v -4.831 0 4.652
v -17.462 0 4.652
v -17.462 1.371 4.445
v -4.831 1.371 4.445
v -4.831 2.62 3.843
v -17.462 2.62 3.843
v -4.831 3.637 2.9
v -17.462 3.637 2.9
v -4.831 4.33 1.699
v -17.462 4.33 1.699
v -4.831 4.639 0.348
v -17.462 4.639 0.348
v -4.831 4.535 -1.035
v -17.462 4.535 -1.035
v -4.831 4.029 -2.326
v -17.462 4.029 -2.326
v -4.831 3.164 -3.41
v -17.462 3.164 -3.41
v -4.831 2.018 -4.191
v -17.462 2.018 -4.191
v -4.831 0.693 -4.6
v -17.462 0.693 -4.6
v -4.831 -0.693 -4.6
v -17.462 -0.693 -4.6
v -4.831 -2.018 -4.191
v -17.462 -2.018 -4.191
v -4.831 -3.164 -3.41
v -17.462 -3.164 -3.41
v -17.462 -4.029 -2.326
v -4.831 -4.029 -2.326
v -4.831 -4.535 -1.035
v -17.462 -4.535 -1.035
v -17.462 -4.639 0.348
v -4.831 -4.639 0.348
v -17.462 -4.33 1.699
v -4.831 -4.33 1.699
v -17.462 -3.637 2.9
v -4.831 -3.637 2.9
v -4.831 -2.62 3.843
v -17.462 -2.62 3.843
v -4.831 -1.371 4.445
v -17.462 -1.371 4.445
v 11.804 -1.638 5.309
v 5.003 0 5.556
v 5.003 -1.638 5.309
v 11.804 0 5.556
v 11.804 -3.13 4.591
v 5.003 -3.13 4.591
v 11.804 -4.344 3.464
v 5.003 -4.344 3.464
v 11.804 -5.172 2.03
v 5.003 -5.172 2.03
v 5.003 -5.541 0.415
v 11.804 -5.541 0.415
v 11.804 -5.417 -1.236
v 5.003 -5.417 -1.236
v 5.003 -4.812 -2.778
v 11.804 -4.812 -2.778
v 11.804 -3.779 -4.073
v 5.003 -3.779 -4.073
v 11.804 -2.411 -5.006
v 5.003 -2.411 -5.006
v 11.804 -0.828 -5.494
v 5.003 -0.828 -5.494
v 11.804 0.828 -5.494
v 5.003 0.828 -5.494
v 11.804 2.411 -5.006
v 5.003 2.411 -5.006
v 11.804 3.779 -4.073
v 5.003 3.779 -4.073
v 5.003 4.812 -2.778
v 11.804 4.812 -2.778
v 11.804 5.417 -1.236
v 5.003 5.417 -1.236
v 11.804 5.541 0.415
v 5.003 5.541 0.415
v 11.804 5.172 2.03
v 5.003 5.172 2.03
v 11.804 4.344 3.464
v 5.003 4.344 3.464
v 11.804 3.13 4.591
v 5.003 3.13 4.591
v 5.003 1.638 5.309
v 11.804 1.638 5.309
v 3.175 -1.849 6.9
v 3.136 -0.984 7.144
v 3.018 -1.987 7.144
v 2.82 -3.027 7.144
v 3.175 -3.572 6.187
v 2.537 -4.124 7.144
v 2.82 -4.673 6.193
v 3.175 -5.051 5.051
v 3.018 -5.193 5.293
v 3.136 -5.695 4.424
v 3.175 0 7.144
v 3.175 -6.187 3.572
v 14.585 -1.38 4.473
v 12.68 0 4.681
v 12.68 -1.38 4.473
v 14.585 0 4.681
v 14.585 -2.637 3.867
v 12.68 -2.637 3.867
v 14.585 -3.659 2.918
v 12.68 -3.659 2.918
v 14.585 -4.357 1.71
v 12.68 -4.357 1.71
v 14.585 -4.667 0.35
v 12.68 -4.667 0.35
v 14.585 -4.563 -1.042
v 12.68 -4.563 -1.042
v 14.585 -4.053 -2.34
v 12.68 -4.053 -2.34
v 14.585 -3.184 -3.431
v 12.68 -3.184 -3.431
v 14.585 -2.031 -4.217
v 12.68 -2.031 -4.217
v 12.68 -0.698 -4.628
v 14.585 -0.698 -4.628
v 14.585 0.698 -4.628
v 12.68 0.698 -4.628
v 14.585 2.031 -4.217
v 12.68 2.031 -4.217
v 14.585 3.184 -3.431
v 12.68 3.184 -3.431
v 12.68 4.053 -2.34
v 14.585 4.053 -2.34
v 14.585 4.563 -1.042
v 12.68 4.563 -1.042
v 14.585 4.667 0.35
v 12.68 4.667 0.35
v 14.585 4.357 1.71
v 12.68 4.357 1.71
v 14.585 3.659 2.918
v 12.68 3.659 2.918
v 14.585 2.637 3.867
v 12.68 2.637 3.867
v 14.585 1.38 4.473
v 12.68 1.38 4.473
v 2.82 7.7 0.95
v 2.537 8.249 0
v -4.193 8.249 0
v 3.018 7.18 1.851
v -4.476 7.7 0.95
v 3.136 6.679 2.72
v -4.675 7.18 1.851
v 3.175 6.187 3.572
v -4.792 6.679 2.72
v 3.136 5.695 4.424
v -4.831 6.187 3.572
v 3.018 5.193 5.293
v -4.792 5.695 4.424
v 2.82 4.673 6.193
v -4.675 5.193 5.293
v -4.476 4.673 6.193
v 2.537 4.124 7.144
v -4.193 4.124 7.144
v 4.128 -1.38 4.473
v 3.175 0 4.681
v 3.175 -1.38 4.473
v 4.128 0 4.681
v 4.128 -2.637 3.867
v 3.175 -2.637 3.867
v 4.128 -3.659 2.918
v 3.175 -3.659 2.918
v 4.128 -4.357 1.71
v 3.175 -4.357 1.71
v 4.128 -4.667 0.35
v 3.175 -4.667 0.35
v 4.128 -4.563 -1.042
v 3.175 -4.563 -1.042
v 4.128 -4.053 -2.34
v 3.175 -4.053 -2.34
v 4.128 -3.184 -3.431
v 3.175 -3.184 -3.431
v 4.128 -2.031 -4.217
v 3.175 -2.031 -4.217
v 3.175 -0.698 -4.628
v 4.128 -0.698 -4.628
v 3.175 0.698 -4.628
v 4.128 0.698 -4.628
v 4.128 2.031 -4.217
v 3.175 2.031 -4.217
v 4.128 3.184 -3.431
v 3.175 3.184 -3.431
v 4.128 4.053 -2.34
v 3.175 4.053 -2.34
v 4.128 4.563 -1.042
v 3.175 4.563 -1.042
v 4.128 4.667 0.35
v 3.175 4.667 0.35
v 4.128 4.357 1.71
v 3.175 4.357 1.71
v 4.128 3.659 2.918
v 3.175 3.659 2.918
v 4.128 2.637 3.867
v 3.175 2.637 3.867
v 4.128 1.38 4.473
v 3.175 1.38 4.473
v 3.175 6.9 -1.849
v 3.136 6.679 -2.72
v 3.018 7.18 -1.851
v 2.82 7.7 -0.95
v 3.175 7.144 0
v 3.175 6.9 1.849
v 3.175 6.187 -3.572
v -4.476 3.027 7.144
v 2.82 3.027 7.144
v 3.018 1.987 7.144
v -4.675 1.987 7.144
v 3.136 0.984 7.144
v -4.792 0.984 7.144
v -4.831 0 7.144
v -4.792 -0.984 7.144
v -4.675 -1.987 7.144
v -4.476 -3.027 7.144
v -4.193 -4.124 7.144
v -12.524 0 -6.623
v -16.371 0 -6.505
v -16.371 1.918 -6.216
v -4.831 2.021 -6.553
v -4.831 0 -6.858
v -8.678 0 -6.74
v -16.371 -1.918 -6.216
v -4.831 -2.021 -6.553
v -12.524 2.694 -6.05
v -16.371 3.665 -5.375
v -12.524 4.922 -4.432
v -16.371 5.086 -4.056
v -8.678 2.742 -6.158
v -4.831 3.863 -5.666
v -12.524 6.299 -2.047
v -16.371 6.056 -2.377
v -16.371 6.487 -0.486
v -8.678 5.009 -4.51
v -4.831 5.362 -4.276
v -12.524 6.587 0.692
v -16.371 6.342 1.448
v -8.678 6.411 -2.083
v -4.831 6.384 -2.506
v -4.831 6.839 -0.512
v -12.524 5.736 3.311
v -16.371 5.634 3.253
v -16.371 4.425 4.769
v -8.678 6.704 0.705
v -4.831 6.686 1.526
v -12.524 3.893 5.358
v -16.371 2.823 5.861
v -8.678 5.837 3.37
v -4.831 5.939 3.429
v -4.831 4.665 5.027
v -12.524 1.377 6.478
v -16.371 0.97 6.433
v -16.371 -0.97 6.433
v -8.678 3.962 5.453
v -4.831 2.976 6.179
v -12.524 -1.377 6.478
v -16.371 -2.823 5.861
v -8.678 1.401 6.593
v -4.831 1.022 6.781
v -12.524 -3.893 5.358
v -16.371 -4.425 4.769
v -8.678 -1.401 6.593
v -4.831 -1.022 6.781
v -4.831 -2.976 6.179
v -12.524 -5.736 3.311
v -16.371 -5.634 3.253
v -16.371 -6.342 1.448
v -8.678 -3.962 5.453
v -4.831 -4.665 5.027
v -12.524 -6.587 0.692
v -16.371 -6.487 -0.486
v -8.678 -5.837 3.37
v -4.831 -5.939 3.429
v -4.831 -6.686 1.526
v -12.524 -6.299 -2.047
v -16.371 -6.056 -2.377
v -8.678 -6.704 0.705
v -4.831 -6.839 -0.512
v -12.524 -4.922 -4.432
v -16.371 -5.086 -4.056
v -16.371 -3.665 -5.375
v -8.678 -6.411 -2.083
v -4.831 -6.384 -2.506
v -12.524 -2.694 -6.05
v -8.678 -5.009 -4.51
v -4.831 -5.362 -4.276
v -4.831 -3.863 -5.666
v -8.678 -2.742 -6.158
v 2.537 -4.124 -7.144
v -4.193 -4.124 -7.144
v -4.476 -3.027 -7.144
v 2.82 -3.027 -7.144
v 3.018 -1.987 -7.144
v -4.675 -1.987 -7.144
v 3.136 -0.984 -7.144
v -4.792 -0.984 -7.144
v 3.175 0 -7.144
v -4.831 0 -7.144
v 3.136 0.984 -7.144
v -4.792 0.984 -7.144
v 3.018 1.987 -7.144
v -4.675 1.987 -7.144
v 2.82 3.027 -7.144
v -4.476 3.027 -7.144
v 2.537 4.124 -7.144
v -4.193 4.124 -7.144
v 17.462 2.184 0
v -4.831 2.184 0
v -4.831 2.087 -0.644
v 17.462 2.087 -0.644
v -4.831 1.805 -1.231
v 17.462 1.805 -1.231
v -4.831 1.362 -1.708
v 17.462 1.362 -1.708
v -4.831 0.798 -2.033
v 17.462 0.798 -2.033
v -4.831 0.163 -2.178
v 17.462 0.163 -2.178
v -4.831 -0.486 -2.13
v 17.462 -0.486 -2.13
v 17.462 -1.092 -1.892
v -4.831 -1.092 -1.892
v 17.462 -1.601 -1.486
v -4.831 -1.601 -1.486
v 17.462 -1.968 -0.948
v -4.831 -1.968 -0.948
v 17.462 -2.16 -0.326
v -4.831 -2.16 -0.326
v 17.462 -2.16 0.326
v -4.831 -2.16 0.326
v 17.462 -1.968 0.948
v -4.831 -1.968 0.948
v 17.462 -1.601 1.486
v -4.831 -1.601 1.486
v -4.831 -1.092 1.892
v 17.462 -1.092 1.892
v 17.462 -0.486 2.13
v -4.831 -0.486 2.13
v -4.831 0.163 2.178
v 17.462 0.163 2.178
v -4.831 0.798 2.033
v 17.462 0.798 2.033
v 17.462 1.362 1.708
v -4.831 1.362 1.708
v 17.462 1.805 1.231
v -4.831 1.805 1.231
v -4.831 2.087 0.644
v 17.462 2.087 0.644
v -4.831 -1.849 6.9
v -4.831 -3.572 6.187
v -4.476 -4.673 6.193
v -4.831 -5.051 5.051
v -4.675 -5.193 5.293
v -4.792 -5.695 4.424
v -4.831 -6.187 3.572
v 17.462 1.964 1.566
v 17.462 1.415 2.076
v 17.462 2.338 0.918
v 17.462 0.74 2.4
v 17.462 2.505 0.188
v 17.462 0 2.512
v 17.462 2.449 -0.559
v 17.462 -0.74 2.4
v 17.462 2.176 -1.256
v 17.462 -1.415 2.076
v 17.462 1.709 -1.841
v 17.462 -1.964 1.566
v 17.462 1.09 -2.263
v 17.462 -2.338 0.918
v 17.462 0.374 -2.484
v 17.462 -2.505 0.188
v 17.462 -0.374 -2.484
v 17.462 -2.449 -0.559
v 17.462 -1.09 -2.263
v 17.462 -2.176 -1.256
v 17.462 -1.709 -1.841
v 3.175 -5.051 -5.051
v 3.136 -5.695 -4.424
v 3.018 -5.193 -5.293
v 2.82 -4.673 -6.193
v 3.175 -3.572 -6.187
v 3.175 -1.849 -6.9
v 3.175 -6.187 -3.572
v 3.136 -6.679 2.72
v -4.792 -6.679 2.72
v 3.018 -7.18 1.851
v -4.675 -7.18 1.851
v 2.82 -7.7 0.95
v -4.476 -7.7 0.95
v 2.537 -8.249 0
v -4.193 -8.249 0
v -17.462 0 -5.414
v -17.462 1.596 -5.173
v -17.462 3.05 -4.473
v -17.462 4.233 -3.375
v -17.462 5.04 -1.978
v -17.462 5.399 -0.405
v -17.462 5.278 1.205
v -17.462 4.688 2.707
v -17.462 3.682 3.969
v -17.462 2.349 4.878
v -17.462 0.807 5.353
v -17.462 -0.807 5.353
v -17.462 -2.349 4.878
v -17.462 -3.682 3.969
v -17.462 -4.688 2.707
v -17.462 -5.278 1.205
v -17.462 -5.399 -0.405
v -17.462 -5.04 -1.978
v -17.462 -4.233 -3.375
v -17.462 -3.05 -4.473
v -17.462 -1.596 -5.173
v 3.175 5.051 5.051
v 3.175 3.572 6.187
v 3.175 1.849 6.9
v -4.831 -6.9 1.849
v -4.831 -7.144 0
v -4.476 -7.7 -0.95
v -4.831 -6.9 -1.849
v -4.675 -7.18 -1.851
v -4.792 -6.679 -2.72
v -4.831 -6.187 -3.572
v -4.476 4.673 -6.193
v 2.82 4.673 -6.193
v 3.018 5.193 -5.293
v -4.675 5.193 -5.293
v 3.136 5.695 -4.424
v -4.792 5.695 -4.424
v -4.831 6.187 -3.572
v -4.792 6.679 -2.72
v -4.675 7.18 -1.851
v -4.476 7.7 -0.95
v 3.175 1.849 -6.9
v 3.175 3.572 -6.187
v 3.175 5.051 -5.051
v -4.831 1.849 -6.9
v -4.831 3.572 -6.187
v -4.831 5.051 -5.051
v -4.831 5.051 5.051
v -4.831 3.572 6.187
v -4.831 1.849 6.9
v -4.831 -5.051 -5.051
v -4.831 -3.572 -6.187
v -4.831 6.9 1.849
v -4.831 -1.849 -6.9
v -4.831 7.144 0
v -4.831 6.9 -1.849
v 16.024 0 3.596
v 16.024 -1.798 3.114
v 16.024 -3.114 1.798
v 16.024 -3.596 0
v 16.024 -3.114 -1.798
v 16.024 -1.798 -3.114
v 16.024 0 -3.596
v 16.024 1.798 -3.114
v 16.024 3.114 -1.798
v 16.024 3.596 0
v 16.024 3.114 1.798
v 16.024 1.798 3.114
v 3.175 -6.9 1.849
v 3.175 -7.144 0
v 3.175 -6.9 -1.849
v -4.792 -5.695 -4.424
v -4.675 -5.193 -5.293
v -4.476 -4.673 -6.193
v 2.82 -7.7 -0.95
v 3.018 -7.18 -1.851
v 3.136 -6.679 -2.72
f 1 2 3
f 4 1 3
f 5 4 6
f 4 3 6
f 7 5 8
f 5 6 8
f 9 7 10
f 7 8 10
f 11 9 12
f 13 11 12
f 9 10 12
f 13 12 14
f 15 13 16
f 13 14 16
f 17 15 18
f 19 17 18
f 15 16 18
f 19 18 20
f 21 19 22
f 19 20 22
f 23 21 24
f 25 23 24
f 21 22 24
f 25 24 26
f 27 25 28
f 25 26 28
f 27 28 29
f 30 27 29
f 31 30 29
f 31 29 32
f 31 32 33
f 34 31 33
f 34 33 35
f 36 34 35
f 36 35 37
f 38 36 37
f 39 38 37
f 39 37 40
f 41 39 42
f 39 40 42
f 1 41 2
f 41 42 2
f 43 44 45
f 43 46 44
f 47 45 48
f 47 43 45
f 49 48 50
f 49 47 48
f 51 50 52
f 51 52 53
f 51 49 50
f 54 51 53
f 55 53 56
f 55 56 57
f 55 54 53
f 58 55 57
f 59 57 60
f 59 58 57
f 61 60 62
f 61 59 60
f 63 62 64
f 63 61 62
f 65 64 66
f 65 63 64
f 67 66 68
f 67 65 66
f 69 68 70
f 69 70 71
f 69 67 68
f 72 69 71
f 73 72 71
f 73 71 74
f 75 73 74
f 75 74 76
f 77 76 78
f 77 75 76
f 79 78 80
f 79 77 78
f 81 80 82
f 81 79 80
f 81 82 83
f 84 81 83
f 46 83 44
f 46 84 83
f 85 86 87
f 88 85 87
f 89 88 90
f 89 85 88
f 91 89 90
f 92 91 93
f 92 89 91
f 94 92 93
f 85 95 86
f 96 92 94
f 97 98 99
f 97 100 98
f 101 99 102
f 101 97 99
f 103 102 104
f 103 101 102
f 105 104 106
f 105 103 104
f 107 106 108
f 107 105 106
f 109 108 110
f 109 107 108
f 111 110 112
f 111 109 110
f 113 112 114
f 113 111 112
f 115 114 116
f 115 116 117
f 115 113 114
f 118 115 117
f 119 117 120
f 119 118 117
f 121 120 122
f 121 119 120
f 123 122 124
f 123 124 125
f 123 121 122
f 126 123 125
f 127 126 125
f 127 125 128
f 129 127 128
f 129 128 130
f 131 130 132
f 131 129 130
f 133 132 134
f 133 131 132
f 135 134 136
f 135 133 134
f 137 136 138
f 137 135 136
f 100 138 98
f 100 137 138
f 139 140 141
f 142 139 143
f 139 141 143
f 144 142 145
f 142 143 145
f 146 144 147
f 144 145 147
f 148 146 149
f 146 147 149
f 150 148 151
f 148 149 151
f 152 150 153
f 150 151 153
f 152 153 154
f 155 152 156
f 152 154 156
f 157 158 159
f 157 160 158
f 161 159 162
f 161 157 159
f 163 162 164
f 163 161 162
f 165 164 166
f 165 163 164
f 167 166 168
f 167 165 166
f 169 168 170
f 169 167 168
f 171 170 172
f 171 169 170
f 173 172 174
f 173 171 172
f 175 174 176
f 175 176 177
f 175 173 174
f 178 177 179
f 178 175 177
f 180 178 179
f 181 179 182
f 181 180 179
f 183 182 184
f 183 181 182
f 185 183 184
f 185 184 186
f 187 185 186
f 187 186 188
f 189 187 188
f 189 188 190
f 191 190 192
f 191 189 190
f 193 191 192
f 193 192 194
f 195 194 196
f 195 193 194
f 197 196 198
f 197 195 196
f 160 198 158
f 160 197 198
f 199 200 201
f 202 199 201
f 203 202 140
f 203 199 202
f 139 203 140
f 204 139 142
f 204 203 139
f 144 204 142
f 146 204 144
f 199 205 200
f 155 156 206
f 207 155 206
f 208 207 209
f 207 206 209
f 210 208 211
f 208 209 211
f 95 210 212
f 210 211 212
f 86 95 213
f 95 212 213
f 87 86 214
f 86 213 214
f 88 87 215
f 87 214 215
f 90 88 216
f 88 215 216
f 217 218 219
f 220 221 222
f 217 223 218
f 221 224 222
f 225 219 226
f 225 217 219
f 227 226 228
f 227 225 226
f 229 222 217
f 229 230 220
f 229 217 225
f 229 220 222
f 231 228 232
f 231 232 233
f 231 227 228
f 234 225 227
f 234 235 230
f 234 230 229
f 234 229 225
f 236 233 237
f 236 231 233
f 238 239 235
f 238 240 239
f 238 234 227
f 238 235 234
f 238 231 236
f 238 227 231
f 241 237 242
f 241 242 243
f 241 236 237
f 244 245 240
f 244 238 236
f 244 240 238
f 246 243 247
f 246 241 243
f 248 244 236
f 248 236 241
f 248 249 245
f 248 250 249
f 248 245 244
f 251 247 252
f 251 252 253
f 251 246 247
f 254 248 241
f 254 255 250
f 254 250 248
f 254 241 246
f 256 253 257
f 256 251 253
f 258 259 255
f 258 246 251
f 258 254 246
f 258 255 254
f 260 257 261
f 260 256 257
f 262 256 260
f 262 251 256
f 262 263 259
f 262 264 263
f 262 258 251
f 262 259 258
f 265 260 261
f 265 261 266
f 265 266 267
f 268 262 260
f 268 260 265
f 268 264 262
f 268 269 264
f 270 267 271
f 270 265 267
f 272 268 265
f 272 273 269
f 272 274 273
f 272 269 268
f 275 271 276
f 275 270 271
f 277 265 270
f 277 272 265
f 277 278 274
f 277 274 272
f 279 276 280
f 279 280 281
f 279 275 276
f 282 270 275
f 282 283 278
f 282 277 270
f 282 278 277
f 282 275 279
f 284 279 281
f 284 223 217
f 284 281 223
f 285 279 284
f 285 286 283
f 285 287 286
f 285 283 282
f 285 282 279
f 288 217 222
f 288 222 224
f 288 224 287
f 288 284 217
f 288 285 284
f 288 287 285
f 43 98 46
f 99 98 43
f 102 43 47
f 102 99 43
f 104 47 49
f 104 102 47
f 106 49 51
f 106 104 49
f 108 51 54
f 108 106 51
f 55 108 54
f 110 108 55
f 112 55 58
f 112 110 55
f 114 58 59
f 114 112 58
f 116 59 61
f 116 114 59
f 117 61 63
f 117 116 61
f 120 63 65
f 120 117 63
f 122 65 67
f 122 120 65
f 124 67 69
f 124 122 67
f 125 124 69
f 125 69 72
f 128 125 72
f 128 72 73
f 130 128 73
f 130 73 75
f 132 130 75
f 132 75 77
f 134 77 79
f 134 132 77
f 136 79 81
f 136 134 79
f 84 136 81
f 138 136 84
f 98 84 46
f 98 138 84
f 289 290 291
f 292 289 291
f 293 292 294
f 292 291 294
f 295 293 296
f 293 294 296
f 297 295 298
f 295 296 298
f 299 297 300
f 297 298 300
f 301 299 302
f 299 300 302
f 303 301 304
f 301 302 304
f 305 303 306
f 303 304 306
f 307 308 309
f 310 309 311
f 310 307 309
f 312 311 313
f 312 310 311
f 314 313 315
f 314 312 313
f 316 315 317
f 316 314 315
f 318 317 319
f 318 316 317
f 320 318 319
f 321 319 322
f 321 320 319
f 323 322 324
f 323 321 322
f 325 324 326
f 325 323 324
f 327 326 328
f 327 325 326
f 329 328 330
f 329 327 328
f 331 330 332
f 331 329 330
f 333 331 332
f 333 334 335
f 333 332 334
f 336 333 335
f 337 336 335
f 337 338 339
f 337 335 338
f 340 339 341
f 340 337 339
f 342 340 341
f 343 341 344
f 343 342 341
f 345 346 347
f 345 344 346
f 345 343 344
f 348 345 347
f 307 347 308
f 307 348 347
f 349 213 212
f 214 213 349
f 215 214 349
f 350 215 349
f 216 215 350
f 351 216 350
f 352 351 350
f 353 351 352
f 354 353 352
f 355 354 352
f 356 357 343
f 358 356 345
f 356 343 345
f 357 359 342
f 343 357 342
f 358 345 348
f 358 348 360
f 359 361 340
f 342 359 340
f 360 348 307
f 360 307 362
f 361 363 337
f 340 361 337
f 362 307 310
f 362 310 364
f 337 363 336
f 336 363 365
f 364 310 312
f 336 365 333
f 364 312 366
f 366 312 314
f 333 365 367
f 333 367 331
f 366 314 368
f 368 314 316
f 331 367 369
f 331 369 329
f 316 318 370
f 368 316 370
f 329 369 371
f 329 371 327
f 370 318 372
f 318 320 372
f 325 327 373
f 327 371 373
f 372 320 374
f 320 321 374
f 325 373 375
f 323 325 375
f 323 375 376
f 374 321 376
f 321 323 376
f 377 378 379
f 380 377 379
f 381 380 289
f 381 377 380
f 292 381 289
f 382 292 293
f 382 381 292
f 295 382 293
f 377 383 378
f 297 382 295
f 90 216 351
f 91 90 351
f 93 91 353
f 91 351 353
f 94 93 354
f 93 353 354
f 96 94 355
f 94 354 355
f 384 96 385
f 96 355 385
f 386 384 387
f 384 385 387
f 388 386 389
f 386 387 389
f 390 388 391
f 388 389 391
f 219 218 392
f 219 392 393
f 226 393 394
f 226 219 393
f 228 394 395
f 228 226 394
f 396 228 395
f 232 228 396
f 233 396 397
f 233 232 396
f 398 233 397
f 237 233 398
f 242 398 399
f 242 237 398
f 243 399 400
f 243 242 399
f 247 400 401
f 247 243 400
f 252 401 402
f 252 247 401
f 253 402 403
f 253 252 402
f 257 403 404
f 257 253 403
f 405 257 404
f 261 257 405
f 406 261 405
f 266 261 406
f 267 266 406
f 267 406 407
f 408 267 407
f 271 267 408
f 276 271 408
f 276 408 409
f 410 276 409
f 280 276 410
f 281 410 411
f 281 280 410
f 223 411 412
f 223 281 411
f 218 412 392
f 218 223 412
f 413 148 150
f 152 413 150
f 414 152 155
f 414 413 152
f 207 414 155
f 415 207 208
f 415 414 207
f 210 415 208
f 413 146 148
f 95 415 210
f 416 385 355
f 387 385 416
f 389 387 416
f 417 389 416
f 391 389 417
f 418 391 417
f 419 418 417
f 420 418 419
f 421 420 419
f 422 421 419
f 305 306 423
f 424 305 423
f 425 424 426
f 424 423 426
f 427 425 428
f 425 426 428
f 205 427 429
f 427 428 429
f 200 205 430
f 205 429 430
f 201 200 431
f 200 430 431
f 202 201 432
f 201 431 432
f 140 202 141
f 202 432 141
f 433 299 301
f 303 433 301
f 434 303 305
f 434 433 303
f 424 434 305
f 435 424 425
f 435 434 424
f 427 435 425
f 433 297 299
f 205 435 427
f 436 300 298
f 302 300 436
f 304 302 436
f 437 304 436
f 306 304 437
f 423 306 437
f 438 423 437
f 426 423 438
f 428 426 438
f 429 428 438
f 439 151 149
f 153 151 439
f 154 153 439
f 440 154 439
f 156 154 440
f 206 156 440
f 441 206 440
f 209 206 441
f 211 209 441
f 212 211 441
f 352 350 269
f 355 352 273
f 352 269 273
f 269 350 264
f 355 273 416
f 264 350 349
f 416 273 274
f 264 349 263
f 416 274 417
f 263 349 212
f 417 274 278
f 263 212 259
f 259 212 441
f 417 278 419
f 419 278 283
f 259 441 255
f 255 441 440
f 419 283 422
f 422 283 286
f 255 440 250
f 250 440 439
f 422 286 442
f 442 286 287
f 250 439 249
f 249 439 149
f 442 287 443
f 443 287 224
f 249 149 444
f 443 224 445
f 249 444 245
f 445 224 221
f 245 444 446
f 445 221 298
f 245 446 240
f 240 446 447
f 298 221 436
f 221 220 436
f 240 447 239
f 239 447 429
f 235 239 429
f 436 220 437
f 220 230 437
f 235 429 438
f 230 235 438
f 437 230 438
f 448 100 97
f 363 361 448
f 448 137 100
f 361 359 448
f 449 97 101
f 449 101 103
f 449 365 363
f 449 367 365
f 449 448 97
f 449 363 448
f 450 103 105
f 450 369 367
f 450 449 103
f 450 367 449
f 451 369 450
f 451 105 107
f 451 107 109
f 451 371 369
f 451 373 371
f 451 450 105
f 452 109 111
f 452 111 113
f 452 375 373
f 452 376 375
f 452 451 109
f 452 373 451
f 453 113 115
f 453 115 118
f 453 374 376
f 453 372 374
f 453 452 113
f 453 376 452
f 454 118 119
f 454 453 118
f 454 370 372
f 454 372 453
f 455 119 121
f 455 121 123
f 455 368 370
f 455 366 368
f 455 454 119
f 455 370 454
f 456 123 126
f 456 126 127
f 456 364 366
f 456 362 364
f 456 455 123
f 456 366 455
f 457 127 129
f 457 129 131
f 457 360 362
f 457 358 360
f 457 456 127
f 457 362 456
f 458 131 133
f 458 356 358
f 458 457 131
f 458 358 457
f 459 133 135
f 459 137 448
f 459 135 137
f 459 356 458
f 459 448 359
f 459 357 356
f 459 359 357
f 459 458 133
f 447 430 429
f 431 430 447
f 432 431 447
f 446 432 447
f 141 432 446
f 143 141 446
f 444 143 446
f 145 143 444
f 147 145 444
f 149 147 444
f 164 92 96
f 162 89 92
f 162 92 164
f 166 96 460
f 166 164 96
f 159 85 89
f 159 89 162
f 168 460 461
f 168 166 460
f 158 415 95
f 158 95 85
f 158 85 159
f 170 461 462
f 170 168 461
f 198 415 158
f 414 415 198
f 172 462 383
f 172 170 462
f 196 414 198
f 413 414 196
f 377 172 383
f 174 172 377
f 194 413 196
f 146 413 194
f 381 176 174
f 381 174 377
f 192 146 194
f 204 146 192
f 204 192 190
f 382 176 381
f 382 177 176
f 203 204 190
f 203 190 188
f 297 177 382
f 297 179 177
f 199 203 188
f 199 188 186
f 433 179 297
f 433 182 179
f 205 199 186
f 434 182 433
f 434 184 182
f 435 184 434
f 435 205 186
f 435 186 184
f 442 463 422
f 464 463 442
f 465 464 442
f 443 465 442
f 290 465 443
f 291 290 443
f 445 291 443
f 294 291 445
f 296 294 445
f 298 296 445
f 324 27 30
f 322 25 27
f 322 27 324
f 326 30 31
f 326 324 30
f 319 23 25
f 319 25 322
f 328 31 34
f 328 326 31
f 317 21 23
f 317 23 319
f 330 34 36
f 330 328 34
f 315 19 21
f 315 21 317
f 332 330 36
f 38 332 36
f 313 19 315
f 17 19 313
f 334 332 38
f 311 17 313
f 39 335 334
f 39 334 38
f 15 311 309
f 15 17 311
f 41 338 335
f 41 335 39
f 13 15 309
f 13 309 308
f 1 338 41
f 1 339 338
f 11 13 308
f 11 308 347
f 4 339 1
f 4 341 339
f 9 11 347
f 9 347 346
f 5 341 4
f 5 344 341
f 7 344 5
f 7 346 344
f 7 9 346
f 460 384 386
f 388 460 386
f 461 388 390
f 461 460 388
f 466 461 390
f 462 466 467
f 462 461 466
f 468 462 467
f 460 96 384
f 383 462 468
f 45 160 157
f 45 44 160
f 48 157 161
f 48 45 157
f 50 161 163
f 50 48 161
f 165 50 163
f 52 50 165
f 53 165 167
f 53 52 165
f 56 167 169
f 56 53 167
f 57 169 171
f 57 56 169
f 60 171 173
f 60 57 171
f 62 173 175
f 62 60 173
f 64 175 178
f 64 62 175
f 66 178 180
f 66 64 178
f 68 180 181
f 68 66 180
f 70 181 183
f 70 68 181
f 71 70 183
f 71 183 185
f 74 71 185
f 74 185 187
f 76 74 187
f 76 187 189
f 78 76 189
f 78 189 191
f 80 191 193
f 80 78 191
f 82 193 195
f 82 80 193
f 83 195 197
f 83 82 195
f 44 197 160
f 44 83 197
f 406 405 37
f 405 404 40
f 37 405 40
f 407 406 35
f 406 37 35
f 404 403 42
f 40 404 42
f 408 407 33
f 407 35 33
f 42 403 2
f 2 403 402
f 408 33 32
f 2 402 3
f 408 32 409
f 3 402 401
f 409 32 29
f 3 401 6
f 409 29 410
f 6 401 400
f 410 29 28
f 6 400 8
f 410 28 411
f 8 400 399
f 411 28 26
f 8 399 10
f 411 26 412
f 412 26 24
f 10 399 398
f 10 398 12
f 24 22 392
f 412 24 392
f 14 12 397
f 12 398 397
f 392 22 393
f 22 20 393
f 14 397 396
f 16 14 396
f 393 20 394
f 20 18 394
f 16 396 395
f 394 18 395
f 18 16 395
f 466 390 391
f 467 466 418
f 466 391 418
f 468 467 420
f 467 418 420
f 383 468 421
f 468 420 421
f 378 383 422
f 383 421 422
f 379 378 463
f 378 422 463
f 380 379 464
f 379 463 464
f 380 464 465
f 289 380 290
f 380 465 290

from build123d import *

# Parameters (mm, degrees)
SKETCH6_W           = 34.925
SKETCH6_H           = 5.55625
EXTRUDE1_DEPTH      = 8.00608
SKETCH7_W           = 34.925
SKETCH7_H           = 2.1844
SKETCH17_R          = 5.55625
CUT_EXTRUDE1_DEPTH  = 12.63142
SKETCH19_R          = 6.858
BOSS_EXTRUDE1_DEPTH = 12.63142
BOSS_EXTRUDE1_DRAFT = -1.75
CHAMFER1_SIZE       = 1.058333333
CHAMFER1_SIZE2      = 1.092196811
SKETCH22_R          = 6.858
BOSS_EXTRUDE3_DEPTH = 12.63142
BOSS_EXTRUDE3_DRAFT = -15
SKETCH23_R          = 4.651741881
CUT_EXTRUDE2_DEPTH  = 12.63142


with BuildPart() as part:
    # Sketch6 → Revolve3 (revolve)
    with BuildSketch(Plane.XY, mode=Mode.PRIVATE) as revolve3_sk:
        with Locations((0, 2.778125)):
            Rectangle(SKETCH6_W, SKETCH6_H)
    revolve(revolve3_sk.sketch.rotate(Axis((-17.4625, 0, 0), (1, 0, 0)), 90), axis=Axis((-17.4625, 0, 0), (1, 0, 0)))

    # Sketch12 → Extrude1 (add)
    with BuildSketch(Plane(origin=(-4.83108, 0, 0), x_dir=(0, 0, -1), z_dir=(1, 0, 0))):
        Polygon((0, 8.248891971), (-7.14375, 4.124445986), (-7.14375, -4.124445986), (0, -8.248891971), (7.14375, -4.124445986), (7.14375, 4.124445986), align=None)
    extrude(amount=EXTRUDE1_DEPTH)

    # Sketch10 → Cut-Revolve6 (revolve, cut)
    with BuildSketch(Plane.XY, mode=Mode.PRIVATE) as cut_revolve6_sk:
        Polygon((5.003189197, 5.55625), (3.175, 5.55625), (3.175, 4.680560803), (4.1275, 4.680560803), align=None)
        Polygon((17.4625, 5.55625), (11.804113042, 5.55625), (12.679802239, 4.680560803), (14.584802239, 4.680560803), (17.4625, 2.51206), align=None)
    revolve(cut_revolve6_sk.sketch.rotate(Axis((-17.4625, 0, 0), (1, 0, 0)), 90), axis=Axis((-17.4625, 0, 0), (1, 0, 0)), mode=Mode.SUBTRACT)

    # Sketch7 → Cut-Revolve5 (revolve, cut)
    with BuildSketch(Plane.XY):
        with Locations((0, 1.0922)):
            Rectangle(SKETCH7_W, SKETCH7_H)
    revolve(axis=Axis((17.4625, 0, 0), (-1, 0, 0)), mode=Mode.SUBTRACT)

    # Sketch13 → Cut-Revolve7 (revolve, cut)
    with BuildSketch(Plane.XY):
        Polygon((-4.83108, 8.248891971), (-4.83108, 7.14375), (-4.193025986, 8.248891971), align=None)
        Polygon((2.536945986, 8.248891971), (3.175, 7.14375), (3.175, 8.248891971), align=None)
    revolve(axis=Axis((-17.4625, 0, 0), (1, 0, 0)), mode=Mode.SUBTRACT)

    # Sketch17 → Cut-Extrude1 (cut)
    with BuildSketch(Plane.ZY.offset(17.4625)):
        Circle(SKETCH17_R)
    extrude(amount=-CUT_EXTRUDE1_DEPTH, mode=Mode.SUBTRACT)


with BuildPart() as body_2:
    # Sketch19 → Boss-Extrude1 (with draft: the straight prism first)
    with BuildSketch(Plane(origin=(-4.83108, 0, 0), x_dir=(0, 0, -1), z_dir=(1, 0, 0))):
        Circle(SKETCH19_R)
    extrude(amount=-BOSS_EXTRUDE1_DEPTH)
    # Boss-Extrude1: the draft: its side faces are tilted about the plane it starts from
    boss_extrude1_sides = [body_2.faces().sort_by_distance(p)[0] for p in [
        (-11.14679, 0, 6.858),
    ]]
    draft(boss_extrude1_sides, Plane(origin=(-4.83108, 0, 0), x_dir=(0, 0, -1), z_dir=(1, 0, 0)), BOSS_EXTRUDE1_DRAFT)

    # Chamfer1
    chamfer1_edges = [body_2.edges().sort_by_distance(p)[0] for p in [
        (-17.4625, 0, 6.472075215),
    ]]
    chamfer1_side = [body_2.faces().sort_by_distance(p)[0] for p in [
        (-17.4625, 0, 0),
    ]]
    chamfer(chamfer1_edges, length=CHAMFER1_SIZE, length2=CHAMFER1_SIZE2, reference=chamfer1_side[0])


with BuildPart() as boss_extrude3_tool:
    # Sketch22 → Boss-Extrude3 (with draft: the straight prism first)
    with BuildSketch(Plane(origin=(-4.83108, 0, 0), x_dir=(0, 0, -1), z_dir=(1, 0, 0))):
        Circle(SKETCH22_R)
    extrude(amount=-BOSS_EXTRUDE3_DEPTH)
    # Boss-Extrude3: the draft: its side faces are tilted about the plane it starts from
    boss_extrude3_sides = [boss_extrude3_tool.faces().sort_by_distance(p)[0] for p in [
        (-11.14679, 0, 6.858),
    ]]
    draft(boss_extrude3_sides, Plane(origin=(-4.83108, 0, 0), x_dir=(0, 0, -1), z_dir=(1, 0, 0)), BOSS_EXTRUDE3_DRAFT)


with BuildPart() as body_2_1:
    add(body_2.part)

    # Boss-Extrude3: add boss_extrude3_tool
    add(boss_extrude3_tool.part)

    # Combine1: union part
    add(part.part)

    # Sketch23 → Cut-Extrude2 (cut)
    with BuildSketch(Plane.ZY.offset(17.4625)):
        Circle(SKETCH23_R)
    extrude(amount=-CUT_EXTRUDE2_DEPTH, mode=Mode.SUBTRACT)


solid = body_2_1.part
